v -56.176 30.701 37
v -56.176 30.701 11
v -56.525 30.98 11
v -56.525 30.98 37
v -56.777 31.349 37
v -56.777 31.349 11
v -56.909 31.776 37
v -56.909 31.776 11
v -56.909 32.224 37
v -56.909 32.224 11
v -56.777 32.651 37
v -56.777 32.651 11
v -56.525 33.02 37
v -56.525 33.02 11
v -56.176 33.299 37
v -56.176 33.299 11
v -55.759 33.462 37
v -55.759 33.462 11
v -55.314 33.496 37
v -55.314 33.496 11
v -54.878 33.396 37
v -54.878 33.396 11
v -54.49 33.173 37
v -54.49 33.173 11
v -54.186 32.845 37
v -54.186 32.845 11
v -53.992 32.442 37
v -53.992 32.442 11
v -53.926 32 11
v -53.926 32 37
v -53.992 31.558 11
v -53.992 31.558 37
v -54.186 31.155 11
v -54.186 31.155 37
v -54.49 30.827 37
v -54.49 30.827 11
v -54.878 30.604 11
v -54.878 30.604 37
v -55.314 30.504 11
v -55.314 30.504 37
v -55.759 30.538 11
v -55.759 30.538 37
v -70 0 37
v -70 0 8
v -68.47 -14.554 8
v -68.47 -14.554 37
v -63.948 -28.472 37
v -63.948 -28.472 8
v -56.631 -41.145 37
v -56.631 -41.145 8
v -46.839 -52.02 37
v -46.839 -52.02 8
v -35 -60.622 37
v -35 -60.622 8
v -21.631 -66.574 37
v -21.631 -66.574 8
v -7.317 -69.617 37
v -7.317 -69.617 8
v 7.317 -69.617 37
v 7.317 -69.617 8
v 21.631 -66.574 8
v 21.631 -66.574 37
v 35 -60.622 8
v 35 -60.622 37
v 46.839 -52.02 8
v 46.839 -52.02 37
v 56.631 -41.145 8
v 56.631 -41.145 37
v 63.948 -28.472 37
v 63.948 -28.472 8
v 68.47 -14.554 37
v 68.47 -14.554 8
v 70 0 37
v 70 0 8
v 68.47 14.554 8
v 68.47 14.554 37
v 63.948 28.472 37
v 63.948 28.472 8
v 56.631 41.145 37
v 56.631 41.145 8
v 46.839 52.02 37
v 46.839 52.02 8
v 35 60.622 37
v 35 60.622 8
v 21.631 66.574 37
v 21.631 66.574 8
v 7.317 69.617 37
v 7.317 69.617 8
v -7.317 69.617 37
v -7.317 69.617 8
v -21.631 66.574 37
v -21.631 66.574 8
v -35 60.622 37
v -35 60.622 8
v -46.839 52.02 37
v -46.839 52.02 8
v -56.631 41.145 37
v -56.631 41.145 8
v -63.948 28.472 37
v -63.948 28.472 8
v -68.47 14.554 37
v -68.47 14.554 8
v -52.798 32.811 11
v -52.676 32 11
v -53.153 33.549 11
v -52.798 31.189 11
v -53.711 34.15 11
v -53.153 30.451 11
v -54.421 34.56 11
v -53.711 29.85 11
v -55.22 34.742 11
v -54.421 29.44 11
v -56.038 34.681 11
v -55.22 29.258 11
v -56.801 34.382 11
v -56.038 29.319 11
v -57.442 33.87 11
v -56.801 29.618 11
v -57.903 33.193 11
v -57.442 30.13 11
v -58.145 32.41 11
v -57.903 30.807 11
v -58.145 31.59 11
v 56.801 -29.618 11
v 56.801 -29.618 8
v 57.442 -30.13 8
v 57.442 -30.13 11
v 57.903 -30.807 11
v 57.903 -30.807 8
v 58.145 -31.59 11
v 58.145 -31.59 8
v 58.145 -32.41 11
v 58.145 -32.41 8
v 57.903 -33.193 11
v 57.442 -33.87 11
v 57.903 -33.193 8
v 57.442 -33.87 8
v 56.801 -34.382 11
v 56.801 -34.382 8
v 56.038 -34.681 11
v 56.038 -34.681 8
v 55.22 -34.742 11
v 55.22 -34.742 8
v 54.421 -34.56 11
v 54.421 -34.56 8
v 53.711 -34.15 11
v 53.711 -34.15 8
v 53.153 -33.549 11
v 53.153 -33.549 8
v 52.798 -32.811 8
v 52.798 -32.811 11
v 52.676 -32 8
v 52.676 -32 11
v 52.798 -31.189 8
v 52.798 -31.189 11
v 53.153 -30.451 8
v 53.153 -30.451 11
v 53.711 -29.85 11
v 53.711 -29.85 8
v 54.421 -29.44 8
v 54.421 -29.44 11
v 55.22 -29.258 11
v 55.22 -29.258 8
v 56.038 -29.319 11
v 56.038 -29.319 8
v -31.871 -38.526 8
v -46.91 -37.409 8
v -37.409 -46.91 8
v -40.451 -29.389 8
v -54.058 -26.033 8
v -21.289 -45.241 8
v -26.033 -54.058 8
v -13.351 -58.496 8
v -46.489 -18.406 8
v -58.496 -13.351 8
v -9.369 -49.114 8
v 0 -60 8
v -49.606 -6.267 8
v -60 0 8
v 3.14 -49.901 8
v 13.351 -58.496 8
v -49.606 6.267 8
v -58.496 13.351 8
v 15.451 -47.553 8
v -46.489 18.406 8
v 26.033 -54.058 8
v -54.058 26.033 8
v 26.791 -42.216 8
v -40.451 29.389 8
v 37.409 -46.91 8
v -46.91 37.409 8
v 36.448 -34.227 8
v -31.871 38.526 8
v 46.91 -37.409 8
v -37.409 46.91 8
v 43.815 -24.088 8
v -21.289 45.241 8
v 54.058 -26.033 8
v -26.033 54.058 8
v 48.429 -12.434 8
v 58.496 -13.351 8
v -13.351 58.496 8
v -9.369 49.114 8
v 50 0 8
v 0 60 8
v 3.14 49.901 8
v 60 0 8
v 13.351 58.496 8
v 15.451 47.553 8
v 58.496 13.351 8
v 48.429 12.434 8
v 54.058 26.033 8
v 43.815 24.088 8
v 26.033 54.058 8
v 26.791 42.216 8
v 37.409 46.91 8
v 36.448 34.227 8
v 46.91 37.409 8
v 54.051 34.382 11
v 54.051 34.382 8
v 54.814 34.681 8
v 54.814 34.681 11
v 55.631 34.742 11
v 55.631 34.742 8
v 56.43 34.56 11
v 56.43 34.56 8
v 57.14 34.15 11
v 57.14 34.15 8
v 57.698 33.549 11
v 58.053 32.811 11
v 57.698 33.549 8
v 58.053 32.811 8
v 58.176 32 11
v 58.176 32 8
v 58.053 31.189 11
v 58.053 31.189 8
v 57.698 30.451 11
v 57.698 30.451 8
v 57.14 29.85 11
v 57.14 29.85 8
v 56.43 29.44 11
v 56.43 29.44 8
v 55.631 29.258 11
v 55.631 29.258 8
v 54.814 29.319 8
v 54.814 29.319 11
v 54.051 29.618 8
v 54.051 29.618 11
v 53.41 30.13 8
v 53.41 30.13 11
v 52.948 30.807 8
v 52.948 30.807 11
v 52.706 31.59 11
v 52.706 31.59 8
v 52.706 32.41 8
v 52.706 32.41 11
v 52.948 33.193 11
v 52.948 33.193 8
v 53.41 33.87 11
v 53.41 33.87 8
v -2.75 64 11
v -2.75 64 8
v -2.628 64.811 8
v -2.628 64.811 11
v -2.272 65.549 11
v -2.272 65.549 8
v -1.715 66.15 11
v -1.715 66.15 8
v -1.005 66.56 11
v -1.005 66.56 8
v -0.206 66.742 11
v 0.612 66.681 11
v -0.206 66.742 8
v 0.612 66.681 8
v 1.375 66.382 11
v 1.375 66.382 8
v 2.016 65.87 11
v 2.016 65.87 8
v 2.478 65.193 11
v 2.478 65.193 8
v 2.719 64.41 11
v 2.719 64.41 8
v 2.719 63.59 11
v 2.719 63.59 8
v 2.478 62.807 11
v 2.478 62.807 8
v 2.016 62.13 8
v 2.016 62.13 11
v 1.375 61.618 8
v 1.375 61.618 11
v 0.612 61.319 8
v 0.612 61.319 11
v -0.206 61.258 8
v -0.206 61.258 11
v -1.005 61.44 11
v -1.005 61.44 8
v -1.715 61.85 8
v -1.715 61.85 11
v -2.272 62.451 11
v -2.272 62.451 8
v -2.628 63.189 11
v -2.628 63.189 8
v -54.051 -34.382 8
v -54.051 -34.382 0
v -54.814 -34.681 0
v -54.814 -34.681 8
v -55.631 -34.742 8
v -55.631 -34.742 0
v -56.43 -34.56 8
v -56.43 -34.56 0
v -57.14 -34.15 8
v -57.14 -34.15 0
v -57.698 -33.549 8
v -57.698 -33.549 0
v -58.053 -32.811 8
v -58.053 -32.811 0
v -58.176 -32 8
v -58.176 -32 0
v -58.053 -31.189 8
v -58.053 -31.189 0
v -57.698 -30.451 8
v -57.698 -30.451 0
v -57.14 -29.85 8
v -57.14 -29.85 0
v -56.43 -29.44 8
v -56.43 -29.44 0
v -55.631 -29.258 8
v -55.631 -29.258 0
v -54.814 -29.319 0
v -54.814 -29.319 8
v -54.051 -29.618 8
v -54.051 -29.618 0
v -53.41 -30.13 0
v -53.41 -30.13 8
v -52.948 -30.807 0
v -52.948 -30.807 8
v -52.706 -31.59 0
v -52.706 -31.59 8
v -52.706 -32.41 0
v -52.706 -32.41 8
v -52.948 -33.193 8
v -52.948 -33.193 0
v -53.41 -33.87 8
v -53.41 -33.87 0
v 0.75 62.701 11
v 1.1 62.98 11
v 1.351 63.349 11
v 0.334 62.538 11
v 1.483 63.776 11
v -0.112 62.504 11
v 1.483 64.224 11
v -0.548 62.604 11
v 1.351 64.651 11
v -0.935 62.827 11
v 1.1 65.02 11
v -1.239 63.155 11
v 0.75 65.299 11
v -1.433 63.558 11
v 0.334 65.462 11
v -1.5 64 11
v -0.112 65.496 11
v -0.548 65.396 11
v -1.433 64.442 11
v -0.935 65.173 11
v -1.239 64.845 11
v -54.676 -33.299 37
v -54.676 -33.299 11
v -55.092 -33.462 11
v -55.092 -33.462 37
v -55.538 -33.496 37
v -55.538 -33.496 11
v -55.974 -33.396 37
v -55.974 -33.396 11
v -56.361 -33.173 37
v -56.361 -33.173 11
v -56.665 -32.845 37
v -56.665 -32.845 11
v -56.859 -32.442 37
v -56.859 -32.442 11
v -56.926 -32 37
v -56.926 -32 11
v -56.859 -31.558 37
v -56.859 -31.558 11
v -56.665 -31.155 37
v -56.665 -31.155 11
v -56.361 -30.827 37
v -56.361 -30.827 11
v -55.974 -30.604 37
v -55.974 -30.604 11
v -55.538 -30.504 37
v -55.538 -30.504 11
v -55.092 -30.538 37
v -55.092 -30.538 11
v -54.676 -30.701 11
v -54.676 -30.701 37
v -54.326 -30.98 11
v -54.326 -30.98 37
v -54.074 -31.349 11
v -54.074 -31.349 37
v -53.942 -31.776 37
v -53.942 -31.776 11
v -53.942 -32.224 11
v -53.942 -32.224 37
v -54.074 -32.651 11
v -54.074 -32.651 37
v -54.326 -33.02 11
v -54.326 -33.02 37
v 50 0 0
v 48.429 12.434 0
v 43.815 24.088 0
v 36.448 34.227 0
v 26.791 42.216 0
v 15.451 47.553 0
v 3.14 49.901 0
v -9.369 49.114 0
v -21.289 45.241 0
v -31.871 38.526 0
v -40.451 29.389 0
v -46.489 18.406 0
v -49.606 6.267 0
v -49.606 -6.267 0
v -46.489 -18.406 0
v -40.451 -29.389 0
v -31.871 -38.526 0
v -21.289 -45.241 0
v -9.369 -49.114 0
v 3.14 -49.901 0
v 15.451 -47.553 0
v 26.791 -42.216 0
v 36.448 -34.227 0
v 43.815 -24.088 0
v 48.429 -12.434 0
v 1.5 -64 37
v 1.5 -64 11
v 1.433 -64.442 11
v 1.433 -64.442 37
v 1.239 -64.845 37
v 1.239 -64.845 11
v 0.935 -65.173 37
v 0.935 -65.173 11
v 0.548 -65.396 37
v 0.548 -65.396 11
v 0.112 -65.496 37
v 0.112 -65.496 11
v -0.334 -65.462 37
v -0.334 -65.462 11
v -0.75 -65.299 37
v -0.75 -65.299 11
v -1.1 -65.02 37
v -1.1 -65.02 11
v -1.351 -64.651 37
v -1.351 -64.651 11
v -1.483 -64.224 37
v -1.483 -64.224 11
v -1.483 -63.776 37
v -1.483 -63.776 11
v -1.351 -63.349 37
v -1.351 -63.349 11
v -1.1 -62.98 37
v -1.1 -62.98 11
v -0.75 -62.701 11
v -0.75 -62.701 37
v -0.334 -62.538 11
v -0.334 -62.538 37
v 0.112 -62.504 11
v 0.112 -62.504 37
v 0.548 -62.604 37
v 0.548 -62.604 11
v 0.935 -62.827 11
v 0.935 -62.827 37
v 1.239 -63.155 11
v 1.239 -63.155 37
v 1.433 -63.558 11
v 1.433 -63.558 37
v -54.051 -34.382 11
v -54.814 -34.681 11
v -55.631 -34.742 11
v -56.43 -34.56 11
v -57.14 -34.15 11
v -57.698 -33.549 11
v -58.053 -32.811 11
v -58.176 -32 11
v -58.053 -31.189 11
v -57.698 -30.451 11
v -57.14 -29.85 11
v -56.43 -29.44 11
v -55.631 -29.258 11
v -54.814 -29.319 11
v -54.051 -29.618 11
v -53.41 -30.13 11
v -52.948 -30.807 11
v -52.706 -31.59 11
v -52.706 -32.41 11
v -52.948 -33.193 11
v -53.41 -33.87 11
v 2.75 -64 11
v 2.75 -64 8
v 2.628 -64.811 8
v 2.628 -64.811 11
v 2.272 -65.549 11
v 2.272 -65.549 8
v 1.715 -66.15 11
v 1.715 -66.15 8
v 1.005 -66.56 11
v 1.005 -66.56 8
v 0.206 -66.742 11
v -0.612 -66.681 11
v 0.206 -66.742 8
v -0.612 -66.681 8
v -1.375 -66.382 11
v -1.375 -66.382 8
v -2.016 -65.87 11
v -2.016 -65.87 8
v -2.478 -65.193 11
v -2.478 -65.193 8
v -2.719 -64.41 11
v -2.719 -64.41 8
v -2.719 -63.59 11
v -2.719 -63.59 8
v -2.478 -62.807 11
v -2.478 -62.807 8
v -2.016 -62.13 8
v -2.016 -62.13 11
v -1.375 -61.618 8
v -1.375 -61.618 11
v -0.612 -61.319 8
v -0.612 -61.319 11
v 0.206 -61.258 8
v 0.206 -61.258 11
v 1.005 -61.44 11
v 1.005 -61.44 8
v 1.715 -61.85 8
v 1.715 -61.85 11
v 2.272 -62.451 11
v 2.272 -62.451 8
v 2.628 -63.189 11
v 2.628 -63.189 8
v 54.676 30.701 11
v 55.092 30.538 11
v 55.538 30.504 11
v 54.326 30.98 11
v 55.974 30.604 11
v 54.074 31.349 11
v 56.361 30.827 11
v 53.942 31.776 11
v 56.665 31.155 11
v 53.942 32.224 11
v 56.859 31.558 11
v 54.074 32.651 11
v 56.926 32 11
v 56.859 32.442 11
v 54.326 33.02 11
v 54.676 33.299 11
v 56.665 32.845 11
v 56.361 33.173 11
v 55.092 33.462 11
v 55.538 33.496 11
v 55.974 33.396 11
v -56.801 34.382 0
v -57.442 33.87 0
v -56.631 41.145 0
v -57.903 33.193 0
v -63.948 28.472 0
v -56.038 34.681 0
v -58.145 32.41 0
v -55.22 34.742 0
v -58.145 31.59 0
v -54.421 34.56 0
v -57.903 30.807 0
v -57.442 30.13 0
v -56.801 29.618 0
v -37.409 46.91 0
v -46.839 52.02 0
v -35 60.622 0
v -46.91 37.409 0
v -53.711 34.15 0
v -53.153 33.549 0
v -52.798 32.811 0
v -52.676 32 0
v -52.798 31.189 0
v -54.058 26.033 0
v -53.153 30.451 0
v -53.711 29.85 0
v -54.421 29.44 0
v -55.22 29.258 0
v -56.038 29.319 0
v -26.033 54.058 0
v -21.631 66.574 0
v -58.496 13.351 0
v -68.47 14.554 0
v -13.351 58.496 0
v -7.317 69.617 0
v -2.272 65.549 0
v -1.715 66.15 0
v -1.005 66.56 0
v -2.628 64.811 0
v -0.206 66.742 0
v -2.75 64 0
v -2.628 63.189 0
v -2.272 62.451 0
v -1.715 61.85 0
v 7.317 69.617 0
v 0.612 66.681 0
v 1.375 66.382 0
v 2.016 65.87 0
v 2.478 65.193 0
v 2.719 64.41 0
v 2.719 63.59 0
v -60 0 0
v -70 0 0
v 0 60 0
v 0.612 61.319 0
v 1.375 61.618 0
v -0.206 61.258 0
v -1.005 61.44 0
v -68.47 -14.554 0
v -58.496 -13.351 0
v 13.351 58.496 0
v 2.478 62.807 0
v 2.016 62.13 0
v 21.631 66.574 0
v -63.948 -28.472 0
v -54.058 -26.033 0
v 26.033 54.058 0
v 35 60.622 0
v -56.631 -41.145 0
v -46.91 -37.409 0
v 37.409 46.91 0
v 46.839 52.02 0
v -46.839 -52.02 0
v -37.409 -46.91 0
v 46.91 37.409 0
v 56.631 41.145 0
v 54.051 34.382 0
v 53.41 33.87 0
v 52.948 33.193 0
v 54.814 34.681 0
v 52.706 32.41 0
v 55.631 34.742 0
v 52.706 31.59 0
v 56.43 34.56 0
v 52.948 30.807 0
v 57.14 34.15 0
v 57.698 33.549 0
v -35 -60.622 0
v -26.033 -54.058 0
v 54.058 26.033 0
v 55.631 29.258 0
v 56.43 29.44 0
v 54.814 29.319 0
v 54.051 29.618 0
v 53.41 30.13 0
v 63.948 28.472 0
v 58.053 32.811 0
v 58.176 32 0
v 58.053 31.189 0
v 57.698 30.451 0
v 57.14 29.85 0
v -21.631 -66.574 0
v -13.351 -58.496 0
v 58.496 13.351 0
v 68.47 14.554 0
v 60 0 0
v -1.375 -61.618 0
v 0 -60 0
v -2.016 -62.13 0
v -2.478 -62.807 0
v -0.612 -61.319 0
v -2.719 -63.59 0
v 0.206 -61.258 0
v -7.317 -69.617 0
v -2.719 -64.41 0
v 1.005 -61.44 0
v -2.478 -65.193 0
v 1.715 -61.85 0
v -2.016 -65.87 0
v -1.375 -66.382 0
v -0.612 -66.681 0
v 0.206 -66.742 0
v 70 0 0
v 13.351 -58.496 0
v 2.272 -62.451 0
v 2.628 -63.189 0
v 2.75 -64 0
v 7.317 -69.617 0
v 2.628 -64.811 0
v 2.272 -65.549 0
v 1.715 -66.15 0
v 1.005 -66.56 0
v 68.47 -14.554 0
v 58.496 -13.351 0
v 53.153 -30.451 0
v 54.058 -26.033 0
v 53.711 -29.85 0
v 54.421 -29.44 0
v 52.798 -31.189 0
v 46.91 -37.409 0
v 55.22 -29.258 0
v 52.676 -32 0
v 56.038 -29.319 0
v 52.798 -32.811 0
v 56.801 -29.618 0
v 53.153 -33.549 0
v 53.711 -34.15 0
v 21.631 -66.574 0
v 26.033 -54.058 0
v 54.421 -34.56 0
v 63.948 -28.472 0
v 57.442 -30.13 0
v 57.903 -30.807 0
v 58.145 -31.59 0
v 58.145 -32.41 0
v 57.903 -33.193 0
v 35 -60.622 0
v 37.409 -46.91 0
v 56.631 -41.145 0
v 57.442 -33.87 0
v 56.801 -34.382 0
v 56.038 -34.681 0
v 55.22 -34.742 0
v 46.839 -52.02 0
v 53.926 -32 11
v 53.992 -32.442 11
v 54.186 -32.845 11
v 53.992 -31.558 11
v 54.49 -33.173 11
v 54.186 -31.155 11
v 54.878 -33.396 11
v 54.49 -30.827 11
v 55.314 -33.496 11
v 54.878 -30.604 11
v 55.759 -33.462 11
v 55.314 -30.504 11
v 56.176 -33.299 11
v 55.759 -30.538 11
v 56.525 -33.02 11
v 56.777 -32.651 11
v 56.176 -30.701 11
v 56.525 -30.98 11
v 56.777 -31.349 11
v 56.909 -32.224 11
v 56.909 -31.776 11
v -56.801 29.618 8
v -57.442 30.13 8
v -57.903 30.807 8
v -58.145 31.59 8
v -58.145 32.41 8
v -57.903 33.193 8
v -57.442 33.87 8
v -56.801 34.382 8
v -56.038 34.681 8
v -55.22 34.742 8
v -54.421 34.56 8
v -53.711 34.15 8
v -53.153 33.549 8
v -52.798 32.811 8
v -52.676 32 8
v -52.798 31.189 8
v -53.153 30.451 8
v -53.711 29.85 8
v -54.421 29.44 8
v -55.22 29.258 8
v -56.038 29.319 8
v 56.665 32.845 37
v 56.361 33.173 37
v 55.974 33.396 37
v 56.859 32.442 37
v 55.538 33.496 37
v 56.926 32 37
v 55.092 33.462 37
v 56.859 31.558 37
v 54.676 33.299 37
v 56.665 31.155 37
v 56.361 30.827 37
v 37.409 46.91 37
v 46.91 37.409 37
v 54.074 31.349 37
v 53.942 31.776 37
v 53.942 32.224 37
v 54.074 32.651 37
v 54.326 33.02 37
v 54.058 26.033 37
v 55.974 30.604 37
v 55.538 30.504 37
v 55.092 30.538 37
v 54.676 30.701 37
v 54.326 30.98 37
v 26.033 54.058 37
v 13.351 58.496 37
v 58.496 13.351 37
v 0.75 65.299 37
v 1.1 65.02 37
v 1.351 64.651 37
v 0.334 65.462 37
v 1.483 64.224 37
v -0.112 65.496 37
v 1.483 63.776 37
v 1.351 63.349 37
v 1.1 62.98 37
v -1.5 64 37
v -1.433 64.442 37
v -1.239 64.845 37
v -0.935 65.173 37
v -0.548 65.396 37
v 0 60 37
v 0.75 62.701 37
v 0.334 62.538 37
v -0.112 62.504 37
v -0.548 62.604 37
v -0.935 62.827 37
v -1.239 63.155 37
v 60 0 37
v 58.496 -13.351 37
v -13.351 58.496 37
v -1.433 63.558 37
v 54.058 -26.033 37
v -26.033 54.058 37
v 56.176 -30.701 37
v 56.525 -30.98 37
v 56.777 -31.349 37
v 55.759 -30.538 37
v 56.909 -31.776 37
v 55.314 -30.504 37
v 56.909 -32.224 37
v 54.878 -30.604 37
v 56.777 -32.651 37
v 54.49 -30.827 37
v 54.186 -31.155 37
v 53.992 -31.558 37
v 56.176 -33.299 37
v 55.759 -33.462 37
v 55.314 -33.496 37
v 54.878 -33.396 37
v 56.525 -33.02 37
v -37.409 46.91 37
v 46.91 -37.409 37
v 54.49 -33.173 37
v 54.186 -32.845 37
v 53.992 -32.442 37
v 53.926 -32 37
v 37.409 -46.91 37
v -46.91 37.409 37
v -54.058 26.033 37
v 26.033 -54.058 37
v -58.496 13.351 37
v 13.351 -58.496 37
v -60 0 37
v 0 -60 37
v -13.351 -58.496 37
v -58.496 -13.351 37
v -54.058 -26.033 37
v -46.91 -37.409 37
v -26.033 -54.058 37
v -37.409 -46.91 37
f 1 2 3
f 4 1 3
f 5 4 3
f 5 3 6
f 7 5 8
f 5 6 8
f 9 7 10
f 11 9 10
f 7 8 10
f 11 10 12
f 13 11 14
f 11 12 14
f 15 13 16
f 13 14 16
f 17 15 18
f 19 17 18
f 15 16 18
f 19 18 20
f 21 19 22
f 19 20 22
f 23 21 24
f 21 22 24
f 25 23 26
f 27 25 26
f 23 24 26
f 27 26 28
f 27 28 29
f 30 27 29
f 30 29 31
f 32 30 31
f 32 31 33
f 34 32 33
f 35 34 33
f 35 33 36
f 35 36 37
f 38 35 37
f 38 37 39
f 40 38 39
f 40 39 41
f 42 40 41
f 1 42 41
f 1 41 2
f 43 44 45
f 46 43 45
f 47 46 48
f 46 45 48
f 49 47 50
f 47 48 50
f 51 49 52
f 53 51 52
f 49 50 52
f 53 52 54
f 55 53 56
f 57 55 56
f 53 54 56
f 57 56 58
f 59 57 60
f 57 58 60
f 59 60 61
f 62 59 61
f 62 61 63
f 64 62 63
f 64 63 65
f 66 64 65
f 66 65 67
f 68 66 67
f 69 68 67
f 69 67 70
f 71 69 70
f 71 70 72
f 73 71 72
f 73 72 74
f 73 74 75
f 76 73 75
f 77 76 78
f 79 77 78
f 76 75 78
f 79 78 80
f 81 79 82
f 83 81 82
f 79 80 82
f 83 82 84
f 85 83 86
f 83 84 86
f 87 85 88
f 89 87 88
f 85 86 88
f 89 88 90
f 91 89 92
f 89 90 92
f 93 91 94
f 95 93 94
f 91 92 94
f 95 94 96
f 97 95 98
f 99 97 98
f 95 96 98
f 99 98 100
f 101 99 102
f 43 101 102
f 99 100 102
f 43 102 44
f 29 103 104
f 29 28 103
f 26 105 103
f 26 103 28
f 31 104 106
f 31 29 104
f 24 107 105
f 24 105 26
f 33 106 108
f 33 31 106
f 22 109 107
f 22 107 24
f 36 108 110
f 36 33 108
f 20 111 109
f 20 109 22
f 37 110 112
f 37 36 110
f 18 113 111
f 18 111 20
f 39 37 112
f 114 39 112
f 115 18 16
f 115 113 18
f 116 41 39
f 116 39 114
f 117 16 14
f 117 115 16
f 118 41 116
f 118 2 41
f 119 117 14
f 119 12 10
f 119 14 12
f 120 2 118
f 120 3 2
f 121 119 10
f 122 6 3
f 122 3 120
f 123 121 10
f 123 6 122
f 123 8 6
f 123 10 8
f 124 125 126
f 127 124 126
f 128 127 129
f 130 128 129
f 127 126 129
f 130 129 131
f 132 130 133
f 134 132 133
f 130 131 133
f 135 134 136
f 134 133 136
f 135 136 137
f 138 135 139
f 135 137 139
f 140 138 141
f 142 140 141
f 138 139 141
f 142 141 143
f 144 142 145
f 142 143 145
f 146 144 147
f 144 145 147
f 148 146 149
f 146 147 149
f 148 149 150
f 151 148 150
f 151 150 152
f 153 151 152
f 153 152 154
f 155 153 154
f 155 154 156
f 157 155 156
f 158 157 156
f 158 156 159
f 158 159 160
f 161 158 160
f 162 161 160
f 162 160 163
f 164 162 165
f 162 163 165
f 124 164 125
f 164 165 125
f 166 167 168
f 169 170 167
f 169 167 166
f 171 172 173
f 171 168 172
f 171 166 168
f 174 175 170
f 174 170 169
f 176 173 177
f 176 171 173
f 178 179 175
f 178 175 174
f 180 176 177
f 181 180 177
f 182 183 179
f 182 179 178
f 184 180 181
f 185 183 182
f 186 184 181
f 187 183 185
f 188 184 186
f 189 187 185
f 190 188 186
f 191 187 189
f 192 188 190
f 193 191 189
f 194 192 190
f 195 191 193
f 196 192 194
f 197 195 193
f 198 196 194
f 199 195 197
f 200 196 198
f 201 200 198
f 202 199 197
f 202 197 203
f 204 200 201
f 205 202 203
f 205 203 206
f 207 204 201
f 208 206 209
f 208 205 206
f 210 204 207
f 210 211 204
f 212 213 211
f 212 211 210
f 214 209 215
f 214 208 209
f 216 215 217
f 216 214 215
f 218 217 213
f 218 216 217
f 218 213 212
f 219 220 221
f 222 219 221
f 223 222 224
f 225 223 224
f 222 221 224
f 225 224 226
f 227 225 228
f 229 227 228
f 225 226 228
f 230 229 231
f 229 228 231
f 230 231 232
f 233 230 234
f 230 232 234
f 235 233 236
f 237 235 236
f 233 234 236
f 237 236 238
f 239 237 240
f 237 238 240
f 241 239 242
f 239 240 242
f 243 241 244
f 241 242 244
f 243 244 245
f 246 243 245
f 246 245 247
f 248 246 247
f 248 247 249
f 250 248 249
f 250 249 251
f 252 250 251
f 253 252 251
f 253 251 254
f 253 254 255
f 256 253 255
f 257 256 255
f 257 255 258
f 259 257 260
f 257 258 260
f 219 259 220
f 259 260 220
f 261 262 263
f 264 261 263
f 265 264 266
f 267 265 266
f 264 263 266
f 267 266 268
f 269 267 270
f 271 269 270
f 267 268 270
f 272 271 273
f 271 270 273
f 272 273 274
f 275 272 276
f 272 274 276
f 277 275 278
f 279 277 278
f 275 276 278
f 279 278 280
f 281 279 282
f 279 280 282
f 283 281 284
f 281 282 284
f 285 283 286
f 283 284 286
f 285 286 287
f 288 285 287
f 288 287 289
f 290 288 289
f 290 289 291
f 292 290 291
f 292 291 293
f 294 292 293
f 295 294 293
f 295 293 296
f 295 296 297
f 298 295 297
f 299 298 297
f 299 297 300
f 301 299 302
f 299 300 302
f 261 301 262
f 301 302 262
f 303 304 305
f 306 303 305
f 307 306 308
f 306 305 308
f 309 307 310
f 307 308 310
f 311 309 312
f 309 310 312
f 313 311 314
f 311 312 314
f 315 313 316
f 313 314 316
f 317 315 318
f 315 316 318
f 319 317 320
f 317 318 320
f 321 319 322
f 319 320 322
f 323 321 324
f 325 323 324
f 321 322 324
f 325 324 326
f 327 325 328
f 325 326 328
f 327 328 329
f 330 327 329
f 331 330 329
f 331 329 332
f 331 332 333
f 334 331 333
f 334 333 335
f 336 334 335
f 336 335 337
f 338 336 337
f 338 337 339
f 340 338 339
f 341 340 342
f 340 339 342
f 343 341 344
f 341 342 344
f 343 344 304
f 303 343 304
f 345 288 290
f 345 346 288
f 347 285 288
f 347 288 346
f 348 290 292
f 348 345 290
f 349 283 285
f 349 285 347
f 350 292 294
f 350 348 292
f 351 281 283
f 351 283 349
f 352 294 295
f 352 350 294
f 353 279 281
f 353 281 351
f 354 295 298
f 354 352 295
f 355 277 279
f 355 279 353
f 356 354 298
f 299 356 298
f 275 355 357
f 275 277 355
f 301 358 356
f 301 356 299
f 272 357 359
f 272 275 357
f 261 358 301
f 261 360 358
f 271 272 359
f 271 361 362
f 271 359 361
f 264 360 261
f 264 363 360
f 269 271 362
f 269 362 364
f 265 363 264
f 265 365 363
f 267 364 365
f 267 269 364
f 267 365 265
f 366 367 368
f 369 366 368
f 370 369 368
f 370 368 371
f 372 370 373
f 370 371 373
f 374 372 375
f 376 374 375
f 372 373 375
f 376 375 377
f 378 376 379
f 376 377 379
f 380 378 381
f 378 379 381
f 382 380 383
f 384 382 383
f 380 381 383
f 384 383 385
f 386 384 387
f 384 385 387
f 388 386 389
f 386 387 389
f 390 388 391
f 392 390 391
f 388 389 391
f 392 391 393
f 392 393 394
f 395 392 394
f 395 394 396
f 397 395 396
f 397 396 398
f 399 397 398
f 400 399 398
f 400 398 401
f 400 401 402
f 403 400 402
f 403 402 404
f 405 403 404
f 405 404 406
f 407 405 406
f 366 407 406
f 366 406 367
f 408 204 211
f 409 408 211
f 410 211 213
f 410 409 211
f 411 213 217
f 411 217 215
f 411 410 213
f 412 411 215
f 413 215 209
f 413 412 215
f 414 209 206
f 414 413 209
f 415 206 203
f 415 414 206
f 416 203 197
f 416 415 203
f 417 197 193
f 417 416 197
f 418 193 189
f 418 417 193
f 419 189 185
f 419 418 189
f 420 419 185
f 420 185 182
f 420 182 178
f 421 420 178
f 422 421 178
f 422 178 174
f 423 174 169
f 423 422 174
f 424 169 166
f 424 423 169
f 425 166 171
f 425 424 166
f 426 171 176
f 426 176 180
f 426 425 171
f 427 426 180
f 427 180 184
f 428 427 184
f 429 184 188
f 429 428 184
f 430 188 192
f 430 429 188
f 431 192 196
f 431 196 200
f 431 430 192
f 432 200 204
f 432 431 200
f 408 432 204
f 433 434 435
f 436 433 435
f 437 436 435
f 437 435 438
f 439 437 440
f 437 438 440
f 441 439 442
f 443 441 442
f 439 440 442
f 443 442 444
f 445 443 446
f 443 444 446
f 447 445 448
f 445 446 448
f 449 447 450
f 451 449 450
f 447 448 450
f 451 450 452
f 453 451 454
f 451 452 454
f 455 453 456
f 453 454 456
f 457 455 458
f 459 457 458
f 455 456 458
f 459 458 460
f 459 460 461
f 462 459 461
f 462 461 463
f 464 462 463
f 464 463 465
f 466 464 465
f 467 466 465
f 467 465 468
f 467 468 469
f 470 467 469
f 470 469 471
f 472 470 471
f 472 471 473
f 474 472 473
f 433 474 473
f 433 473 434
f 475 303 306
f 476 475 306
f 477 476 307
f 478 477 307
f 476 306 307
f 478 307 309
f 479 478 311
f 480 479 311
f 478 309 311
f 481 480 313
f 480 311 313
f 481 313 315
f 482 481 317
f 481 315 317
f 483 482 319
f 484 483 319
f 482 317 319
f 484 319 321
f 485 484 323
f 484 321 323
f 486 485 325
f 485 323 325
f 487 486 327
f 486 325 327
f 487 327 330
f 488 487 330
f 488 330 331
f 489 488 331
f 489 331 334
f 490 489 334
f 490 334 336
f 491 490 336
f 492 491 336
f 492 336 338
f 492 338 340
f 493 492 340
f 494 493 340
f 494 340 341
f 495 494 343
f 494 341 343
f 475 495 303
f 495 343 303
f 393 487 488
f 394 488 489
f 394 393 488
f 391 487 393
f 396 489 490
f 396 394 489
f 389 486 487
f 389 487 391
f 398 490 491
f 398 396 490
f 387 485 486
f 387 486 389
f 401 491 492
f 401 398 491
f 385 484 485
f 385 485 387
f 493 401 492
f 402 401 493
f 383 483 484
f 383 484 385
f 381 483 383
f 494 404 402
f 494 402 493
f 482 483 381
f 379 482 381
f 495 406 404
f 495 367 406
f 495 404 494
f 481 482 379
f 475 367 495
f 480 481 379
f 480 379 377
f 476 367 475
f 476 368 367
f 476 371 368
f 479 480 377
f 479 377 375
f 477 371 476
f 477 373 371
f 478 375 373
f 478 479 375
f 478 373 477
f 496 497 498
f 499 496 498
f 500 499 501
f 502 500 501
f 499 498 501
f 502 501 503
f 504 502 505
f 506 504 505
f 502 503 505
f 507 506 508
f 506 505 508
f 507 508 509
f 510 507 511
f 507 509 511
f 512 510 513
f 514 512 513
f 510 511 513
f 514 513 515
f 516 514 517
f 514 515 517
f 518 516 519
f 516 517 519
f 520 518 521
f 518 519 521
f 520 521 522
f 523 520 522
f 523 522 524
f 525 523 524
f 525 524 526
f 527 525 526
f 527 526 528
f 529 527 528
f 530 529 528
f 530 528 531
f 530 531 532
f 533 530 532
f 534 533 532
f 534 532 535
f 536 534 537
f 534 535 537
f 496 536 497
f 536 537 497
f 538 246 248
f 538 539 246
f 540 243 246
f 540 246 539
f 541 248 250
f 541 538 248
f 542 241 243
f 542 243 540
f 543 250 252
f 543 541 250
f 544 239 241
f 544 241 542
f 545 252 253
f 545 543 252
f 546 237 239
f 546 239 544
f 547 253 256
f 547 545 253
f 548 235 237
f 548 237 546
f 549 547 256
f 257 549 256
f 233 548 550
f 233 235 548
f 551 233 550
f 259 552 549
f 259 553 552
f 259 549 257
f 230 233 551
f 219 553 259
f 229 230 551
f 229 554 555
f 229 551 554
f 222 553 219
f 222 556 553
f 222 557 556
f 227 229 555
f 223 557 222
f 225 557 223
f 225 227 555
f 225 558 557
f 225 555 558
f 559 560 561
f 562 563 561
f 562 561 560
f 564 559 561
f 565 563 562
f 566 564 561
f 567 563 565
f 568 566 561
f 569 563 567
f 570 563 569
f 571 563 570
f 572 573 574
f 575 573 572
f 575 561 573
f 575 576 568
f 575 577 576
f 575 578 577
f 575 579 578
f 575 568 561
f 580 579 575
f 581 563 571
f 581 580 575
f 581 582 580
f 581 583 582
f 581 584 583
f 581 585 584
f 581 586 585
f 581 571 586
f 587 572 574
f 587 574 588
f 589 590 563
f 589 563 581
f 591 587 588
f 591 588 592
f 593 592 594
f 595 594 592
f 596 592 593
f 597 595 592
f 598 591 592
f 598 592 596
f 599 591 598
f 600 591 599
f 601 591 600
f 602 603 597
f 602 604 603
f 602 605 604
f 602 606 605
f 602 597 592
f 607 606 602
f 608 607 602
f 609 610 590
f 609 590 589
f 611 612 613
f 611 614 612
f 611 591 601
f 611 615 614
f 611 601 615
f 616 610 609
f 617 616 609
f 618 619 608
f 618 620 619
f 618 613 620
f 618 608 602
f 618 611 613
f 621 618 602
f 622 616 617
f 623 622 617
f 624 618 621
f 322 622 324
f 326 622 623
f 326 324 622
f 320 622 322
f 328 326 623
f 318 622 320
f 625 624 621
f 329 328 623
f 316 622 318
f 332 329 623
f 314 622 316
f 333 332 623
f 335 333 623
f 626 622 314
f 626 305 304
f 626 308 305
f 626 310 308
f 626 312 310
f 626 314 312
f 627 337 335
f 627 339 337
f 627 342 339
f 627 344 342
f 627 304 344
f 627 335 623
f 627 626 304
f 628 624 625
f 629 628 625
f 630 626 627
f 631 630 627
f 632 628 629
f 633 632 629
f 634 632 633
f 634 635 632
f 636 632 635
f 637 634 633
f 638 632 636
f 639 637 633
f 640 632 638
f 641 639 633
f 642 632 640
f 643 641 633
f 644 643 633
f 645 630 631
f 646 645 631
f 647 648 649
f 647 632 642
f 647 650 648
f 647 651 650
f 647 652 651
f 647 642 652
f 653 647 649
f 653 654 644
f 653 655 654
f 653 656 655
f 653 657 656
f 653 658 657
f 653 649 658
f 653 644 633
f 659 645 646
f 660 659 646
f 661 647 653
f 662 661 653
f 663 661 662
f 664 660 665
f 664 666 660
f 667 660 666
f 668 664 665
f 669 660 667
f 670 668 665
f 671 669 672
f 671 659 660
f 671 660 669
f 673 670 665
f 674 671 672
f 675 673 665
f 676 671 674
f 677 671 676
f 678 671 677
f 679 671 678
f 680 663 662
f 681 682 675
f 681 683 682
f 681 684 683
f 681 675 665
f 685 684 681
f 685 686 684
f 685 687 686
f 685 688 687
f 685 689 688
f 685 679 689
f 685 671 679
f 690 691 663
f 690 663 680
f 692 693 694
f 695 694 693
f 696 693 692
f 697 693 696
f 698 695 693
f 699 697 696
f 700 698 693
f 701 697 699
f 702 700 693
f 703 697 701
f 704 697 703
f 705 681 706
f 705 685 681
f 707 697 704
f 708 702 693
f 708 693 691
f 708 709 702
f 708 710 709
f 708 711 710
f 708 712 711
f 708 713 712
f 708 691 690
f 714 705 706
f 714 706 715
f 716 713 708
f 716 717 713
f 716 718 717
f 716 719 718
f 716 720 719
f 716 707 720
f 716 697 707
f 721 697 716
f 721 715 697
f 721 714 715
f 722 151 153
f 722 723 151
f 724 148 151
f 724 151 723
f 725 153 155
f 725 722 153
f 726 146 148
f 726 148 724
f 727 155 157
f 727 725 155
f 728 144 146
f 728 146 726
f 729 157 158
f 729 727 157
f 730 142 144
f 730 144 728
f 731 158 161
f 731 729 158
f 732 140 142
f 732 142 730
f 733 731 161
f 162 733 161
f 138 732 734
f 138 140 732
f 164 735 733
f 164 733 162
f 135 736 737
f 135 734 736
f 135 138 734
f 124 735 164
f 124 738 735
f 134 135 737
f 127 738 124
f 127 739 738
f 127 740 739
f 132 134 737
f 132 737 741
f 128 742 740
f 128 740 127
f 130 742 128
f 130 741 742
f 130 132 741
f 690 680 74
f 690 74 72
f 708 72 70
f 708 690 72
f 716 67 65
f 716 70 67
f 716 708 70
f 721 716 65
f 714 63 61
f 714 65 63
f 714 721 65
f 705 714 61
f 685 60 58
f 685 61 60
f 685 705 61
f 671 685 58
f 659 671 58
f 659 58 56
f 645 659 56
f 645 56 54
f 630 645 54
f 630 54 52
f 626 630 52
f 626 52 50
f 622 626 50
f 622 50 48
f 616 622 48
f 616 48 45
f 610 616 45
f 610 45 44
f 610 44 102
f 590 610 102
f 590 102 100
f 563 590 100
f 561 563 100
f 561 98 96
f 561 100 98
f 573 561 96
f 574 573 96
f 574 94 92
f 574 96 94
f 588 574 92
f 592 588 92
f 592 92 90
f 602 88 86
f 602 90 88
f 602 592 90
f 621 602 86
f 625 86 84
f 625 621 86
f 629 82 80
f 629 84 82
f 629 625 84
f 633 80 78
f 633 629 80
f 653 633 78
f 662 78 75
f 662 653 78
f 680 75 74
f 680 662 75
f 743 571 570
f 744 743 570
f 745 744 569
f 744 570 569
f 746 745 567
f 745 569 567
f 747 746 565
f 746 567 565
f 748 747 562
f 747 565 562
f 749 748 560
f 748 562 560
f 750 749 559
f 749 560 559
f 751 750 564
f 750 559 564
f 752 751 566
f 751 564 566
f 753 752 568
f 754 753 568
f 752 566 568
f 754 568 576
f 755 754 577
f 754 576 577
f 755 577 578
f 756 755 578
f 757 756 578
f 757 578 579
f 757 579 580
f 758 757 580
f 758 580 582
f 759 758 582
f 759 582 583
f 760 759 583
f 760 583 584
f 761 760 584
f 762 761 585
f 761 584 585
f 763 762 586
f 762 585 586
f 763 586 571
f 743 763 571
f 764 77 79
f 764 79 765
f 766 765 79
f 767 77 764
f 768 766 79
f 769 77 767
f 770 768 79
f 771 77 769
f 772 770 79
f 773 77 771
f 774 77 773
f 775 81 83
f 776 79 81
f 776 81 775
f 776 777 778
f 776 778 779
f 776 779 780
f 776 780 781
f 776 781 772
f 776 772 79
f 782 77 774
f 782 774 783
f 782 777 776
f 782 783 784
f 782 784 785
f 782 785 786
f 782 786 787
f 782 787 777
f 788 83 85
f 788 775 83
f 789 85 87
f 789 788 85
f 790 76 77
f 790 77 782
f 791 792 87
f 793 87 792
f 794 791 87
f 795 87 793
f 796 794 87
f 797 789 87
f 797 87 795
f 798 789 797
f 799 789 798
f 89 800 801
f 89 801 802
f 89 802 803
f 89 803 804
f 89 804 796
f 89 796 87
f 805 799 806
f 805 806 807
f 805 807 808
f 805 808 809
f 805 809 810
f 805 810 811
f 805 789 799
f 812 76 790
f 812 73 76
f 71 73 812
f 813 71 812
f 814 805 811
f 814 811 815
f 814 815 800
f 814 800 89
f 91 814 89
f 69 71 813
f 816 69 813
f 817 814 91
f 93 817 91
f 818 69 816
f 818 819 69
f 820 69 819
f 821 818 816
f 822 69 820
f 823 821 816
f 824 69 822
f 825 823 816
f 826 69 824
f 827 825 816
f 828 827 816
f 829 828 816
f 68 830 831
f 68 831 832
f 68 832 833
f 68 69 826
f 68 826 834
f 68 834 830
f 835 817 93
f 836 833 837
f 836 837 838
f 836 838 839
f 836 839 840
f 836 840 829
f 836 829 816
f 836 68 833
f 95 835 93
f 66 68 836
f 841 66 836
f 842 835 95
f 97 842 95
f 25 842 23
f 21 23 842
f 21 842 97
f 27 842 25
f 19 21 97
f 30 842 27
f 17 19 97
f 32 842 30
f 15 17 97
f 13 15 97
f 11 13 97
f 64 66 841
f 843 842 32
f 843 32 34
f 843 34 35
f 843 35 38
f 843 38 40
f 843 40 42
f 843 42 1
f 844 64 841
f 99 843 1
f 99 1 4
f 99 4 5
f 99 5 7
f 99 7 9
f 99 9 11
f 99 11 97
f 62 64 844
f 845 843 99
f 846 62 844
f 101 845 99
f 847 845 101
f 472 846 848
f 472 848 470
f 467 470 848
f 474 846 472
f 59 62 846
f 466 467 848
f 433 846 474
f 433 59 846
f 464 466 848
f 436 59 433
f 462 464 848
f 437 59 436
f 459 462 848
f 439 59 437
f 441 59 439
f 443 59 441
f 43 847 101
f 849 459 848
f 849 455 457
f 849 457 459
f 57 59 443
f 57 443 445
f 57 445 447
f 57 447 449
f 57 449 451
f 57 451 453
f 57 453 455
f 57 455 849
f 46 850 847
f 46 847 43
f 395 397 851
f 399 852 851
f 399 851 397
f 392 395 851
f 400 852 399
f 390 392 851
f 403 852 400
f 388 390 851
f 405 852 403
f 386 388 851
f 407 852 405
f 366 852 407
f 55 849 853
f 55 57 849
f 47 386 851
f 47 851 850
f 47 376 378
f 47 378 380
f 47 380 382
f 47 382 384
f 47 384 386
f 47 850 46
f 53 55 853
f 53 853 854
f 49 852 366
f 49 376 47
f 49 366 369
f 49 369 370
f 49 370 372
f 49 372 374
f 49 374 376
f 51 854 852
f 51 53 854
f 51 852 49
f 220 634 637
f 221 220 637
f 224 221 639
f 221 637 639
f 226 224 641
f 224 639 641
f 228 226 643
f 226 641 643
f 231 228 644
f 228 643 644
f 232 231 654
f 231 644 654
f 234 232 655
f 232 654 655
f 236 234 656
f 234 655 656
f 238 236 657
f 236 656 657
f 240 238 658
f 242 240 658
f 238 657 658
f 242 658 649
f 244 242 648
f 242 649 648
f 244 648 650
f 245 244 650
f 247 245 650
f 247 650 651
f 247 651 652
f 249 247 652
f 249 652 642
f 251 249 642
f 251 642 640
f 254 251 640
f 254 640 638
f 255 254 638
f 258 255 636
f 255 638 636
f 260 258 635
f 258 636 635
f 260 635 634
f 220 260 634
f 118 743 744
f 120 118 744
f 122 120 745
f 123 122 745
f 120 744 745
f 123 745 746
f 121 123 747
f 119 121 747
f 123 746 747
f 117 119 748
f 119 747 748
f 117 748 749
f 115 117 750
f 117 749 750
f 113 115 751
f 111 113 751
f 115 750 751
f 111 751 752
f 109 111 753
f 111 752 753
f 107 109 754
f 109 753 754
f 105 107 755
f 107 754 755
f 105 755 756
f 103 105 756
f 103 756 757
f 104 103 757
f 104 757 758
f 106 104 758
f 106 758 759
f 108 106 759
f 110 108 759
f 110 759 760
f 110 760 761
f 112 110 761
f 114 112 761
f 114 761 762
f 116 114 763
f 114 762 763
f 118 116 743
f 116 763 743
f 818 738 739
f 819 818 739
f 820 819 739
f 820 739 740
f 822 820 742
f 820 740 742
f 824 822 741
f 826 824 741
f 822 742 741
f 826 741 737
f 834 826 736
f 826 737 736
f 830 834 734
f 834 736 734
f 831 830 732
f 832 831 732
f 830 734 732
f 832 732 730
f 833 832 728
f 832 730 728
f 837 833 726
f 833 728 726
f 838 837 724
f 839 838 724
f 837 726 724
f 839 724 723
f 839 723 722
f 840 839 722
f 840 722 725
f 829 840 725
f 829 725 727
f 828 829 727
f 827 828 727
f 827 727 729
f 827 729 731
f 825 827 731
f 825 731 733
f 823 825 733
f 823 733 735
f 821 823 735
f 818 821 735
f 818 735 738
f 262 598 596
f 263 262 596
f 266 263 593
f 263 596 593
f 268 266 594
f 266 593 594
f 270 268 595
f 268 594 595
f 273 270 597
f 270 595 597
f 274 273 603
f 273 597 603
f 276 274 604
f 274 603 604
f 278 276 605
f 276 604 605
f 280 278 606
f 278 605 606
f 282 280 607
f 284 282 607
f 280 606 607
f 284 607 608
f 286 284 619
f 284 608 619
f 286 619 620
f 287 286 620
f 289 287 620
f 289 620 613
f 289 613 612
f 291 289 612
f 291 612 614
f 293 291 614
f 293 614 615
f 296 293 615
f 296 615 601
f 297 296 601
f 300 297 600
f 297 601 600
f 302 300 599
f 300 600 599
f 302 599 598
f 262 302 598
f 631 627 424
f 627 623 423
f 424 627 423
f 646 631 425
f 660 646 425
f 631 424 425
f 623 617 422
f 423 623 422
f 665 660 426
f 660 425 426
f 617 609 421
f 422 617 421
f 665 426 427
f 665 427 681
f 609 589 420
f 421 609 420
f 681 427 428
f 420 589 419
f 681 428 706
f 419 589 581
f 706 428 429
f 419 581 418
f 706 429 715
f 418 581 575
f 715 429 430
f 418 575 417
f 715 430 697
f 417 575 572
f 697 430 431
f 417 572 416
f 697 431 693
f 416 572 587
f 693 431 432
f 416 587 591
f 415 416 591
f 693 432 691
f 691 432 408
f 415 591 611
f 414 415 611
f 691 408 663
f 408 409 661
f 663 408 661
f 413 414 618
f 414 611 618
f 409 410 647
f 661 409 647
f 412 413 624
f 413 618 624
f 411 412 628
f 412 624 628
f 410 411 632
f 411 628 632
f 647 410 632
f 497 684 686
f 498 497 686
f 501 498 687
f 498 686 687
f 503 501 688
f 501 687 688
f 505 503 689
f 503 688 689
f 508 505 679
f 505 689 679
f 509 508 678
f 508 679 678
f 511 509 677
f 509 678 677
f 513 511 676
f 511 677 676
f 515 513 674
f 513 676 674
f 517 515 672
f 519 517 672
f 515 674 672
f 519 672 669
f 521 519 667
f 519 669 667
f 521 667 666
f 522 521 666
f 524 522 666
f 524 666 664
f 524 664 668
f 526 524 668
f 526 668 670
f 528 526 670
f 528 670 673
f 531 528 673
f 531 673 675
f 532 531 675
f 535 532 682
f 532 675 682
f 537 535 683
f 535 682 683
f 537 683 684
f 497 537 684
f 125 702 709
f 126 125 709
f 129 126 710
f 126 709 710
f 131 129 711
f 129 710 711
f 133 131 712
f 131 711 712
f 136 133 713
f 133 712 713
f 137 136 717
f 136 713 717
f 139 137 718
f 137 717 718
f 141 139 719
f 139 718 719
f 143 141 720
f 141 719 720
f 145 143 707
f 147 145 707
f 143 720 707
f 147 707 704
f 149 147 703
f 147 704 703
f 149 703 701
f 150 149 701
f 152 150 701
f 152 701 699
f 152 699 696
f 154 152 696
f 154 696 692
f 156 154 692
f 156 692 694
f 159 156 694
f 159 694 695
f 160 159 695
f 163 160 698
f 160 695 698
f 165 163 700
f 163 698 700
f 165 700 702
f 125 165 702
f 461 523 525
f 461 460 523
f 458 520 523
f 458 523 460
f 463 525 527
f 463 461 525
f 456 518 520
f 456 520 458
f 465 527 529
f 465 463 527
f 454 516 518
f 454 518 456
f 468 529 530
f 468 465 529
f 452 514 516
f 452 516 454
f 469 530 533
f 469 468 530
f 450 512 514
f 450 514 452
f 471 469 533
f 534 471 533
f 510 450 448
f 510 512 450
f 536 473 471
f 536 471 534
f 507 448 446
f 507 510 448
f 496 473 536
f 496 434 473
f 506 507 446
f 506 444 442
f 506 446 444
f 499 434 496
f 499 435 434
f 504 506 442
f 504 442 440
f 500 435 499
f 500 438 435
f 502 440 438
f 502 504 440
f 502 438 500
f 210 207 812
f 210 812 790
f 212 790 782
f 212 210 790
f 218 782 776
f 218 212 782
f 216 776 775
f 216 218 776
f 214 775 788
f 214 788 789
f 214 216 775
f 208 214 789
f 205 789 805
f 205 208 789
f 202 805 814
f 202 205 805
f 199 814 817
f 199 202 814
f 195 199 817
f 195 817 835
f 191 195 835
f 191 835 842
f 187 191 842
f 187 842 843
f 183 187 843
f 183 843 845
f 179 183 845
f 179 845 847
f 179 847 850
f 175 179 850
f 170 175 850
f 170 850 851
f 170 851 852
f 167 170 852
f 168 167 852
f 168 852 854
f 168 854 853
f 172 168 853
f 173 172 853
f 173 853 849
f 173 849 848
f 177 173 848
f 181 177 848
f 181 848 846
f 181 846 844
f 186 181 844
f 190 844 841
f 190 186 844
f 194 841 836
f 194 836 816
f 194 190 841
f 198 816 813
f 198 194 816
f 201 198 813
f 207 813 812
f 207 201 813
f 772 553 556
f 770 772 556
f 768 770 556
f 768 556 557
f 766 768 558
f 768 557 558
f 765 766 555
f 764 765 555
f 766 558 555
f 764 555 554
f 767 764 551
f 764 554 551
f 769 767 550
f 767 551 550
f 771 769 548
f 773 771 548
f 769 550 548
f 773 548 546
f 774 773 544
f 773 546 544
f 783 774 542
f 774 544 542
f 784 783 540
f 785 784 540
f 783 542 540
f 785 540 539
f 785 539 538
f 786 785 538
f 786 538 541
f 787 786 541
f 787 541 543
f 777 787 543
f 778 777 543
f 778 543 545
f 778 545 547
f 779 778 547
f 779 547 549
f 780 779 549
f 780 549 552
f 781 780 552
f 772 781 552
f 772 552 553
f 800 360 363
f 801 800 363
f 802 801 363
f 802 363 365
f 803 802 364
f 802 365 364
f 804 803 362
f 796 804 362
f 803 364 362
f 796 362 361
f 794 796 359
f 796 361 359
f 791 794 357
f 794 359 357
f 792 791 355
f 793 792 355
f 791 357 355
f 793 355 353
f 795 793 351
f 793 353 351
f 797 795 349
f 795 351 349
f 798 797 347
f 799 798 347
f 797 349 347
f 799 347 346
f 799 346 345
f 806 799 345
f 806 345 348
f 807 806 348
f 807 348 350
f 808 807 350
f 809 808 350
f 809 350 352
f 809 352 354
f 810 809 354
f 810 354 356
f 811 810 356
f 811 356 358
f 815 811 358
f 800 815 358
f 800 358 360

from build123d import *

# Parameters (mm, degrees)
SKETCH1_R           = 60
SKETCH1_R_2         = 50
BOSS_EXTRUDE1_DEPTH = 8
SKETCH2_R           = 70
SKETCH2_R_2         = 60
BOSS_EXTRUDE2_DEPTH = 29
SKETCH3_R           = 1.5
CUT_EXTRUDE2_DEPTH  = 37
SKETCH4_R           = 2.75
CUT_EXTRUDE3_DEPTH  = 3
CIRPATTERN1_COUNT   = 6
BOSS_EXTRUDE3_START = 8
SKETCH7_R           = 70
SKETCH7_R_2         = 60
SKETCH7_R_3         = 2.75
BOSS_EXTRUDE3_DEPTH = 8


with BuildPart() as part:
    # Sketch1 → Boss-Extrude1 (new body)
    with BuildSketch(Plane.XY):
        Circle(SKETCH1_R)
        Circle(SKETCH1_R_2, mode=Mode.SUBTRACT)
    extrude(amount=BOSS_EXTRUDE1_DEPTH)



with BuildPart() as body_2:
    # Sketch2 → Boss-Extrude2 (new body)
    with BuildSketch(Plane.XY.offset(8)):
        with Locations(Location((0, 0, 0), (0, 0, 180))):
            Circle(SKETCH2_R)
        Circle(SKETCH2_R_2, mode=Mode.SUBTRACT)
    extrude(amount=BOSS_EXTRUDE2_DEPTH)

    # Sketch3 → Cut-Extrude2 (cut)
    with BuildSketch(Plane(origin=(0, 0, 8), x_dir=(-1, 0, 0), z_dir=(0, 0, -1))):
        with Locations((0, 64)):
            Circle(SKETCH3_R)
    cut_extrude2 = extrude(amount=-CUT_EXTRUDE2_DEPTH, mode=Mode.SUBTRACT)

    # Sketch4 → Cut-Extrude3 (cut)
    with BuildSketch(Plane(origin=(0, 0, 8), x_dir=(-1, 0, 0), z_dir=(0, 0, -1))):
        with Locations((0, 64)):
            Circle(SKETCH4_R)
    cut_extrude3 = extrude(amount=-CUT_EXTRUDE3_DEPTH, mode=Mode.SUBTRACT)

    # CirPattern1: Cut-Extrude2, Cut-Extrude3 ×6 about axis
    cirpattern1_axis = Axis((0, 0, 0), (0, 0, 1))
    add([cut_extrude2.rotate(cirpattern1_axis, i * 360 / CIRPATTERN1_COUNT) for i in range(1, CIRPATTERN1_COUNT)], mode=Mode.SUBTRACT)
    add([cut_extrude3.rotate(cirpattern1_axis, i * 360 / CIRPATTERN1_COUNT) for i in range(1, CIRPATTERN1_COUNT)], mode=Mode.SUBTRACT)


with BuildPart() as part_1:
    add(part.part)

    add(body_2.part)  # Boss-Extrude3 merges body 2
    # Sketch7 → Boss-Extrude3 (add)
    with BuildSketch(Plane(origin=(0, 0, 8), x_dir=(-1, 0, 0), z_dir=(0, 0, -1)).offset(BOSS_EXTRUDE3_START)):
        with Locations(Location((0, 0, 0), (0, 0, 180))):
            Circle(SKETCH7_R)
        Circle(SKETCH7_R_2, mode=Mode.SUBTRACT)
        with Locations((0, 64)):
            Circle(SKETCH7_R_3, mode=Mode.SUBTRACT)
        with Locations(Location((-55.425625842, 32, 0), (0, 0, 60))):
            Circle(SKETCH7_R_3, mode=Mode.SUBTRACT)
        with Locations(Location((-55.425625842, -32, 0), (0, 0, 120))):
            Circle(SKETCH7_R_3, mode=Mode.SUBTRACT)
        with Locations(Location((0, -64, 0), (0, 0, 180))):
            Circle(SKETCH7_R_3, mode=Mode.SUBTRACT)
        with Locations(Location((55.425625842, -32, 0), (0, 0, 240))):
            Circle(SKETCH7_R_3, mode=Mode.SUBTRACT)
        with Locations(Location((55.425625842, 32, 0), (0, 0, 300))):
            Circle(SKETCH7_R_3, mode=Mode.SUBTRACT)
    extrude(amount=-BOSS_EXTRUDE3_DEPTH)


solid = part_1.part
